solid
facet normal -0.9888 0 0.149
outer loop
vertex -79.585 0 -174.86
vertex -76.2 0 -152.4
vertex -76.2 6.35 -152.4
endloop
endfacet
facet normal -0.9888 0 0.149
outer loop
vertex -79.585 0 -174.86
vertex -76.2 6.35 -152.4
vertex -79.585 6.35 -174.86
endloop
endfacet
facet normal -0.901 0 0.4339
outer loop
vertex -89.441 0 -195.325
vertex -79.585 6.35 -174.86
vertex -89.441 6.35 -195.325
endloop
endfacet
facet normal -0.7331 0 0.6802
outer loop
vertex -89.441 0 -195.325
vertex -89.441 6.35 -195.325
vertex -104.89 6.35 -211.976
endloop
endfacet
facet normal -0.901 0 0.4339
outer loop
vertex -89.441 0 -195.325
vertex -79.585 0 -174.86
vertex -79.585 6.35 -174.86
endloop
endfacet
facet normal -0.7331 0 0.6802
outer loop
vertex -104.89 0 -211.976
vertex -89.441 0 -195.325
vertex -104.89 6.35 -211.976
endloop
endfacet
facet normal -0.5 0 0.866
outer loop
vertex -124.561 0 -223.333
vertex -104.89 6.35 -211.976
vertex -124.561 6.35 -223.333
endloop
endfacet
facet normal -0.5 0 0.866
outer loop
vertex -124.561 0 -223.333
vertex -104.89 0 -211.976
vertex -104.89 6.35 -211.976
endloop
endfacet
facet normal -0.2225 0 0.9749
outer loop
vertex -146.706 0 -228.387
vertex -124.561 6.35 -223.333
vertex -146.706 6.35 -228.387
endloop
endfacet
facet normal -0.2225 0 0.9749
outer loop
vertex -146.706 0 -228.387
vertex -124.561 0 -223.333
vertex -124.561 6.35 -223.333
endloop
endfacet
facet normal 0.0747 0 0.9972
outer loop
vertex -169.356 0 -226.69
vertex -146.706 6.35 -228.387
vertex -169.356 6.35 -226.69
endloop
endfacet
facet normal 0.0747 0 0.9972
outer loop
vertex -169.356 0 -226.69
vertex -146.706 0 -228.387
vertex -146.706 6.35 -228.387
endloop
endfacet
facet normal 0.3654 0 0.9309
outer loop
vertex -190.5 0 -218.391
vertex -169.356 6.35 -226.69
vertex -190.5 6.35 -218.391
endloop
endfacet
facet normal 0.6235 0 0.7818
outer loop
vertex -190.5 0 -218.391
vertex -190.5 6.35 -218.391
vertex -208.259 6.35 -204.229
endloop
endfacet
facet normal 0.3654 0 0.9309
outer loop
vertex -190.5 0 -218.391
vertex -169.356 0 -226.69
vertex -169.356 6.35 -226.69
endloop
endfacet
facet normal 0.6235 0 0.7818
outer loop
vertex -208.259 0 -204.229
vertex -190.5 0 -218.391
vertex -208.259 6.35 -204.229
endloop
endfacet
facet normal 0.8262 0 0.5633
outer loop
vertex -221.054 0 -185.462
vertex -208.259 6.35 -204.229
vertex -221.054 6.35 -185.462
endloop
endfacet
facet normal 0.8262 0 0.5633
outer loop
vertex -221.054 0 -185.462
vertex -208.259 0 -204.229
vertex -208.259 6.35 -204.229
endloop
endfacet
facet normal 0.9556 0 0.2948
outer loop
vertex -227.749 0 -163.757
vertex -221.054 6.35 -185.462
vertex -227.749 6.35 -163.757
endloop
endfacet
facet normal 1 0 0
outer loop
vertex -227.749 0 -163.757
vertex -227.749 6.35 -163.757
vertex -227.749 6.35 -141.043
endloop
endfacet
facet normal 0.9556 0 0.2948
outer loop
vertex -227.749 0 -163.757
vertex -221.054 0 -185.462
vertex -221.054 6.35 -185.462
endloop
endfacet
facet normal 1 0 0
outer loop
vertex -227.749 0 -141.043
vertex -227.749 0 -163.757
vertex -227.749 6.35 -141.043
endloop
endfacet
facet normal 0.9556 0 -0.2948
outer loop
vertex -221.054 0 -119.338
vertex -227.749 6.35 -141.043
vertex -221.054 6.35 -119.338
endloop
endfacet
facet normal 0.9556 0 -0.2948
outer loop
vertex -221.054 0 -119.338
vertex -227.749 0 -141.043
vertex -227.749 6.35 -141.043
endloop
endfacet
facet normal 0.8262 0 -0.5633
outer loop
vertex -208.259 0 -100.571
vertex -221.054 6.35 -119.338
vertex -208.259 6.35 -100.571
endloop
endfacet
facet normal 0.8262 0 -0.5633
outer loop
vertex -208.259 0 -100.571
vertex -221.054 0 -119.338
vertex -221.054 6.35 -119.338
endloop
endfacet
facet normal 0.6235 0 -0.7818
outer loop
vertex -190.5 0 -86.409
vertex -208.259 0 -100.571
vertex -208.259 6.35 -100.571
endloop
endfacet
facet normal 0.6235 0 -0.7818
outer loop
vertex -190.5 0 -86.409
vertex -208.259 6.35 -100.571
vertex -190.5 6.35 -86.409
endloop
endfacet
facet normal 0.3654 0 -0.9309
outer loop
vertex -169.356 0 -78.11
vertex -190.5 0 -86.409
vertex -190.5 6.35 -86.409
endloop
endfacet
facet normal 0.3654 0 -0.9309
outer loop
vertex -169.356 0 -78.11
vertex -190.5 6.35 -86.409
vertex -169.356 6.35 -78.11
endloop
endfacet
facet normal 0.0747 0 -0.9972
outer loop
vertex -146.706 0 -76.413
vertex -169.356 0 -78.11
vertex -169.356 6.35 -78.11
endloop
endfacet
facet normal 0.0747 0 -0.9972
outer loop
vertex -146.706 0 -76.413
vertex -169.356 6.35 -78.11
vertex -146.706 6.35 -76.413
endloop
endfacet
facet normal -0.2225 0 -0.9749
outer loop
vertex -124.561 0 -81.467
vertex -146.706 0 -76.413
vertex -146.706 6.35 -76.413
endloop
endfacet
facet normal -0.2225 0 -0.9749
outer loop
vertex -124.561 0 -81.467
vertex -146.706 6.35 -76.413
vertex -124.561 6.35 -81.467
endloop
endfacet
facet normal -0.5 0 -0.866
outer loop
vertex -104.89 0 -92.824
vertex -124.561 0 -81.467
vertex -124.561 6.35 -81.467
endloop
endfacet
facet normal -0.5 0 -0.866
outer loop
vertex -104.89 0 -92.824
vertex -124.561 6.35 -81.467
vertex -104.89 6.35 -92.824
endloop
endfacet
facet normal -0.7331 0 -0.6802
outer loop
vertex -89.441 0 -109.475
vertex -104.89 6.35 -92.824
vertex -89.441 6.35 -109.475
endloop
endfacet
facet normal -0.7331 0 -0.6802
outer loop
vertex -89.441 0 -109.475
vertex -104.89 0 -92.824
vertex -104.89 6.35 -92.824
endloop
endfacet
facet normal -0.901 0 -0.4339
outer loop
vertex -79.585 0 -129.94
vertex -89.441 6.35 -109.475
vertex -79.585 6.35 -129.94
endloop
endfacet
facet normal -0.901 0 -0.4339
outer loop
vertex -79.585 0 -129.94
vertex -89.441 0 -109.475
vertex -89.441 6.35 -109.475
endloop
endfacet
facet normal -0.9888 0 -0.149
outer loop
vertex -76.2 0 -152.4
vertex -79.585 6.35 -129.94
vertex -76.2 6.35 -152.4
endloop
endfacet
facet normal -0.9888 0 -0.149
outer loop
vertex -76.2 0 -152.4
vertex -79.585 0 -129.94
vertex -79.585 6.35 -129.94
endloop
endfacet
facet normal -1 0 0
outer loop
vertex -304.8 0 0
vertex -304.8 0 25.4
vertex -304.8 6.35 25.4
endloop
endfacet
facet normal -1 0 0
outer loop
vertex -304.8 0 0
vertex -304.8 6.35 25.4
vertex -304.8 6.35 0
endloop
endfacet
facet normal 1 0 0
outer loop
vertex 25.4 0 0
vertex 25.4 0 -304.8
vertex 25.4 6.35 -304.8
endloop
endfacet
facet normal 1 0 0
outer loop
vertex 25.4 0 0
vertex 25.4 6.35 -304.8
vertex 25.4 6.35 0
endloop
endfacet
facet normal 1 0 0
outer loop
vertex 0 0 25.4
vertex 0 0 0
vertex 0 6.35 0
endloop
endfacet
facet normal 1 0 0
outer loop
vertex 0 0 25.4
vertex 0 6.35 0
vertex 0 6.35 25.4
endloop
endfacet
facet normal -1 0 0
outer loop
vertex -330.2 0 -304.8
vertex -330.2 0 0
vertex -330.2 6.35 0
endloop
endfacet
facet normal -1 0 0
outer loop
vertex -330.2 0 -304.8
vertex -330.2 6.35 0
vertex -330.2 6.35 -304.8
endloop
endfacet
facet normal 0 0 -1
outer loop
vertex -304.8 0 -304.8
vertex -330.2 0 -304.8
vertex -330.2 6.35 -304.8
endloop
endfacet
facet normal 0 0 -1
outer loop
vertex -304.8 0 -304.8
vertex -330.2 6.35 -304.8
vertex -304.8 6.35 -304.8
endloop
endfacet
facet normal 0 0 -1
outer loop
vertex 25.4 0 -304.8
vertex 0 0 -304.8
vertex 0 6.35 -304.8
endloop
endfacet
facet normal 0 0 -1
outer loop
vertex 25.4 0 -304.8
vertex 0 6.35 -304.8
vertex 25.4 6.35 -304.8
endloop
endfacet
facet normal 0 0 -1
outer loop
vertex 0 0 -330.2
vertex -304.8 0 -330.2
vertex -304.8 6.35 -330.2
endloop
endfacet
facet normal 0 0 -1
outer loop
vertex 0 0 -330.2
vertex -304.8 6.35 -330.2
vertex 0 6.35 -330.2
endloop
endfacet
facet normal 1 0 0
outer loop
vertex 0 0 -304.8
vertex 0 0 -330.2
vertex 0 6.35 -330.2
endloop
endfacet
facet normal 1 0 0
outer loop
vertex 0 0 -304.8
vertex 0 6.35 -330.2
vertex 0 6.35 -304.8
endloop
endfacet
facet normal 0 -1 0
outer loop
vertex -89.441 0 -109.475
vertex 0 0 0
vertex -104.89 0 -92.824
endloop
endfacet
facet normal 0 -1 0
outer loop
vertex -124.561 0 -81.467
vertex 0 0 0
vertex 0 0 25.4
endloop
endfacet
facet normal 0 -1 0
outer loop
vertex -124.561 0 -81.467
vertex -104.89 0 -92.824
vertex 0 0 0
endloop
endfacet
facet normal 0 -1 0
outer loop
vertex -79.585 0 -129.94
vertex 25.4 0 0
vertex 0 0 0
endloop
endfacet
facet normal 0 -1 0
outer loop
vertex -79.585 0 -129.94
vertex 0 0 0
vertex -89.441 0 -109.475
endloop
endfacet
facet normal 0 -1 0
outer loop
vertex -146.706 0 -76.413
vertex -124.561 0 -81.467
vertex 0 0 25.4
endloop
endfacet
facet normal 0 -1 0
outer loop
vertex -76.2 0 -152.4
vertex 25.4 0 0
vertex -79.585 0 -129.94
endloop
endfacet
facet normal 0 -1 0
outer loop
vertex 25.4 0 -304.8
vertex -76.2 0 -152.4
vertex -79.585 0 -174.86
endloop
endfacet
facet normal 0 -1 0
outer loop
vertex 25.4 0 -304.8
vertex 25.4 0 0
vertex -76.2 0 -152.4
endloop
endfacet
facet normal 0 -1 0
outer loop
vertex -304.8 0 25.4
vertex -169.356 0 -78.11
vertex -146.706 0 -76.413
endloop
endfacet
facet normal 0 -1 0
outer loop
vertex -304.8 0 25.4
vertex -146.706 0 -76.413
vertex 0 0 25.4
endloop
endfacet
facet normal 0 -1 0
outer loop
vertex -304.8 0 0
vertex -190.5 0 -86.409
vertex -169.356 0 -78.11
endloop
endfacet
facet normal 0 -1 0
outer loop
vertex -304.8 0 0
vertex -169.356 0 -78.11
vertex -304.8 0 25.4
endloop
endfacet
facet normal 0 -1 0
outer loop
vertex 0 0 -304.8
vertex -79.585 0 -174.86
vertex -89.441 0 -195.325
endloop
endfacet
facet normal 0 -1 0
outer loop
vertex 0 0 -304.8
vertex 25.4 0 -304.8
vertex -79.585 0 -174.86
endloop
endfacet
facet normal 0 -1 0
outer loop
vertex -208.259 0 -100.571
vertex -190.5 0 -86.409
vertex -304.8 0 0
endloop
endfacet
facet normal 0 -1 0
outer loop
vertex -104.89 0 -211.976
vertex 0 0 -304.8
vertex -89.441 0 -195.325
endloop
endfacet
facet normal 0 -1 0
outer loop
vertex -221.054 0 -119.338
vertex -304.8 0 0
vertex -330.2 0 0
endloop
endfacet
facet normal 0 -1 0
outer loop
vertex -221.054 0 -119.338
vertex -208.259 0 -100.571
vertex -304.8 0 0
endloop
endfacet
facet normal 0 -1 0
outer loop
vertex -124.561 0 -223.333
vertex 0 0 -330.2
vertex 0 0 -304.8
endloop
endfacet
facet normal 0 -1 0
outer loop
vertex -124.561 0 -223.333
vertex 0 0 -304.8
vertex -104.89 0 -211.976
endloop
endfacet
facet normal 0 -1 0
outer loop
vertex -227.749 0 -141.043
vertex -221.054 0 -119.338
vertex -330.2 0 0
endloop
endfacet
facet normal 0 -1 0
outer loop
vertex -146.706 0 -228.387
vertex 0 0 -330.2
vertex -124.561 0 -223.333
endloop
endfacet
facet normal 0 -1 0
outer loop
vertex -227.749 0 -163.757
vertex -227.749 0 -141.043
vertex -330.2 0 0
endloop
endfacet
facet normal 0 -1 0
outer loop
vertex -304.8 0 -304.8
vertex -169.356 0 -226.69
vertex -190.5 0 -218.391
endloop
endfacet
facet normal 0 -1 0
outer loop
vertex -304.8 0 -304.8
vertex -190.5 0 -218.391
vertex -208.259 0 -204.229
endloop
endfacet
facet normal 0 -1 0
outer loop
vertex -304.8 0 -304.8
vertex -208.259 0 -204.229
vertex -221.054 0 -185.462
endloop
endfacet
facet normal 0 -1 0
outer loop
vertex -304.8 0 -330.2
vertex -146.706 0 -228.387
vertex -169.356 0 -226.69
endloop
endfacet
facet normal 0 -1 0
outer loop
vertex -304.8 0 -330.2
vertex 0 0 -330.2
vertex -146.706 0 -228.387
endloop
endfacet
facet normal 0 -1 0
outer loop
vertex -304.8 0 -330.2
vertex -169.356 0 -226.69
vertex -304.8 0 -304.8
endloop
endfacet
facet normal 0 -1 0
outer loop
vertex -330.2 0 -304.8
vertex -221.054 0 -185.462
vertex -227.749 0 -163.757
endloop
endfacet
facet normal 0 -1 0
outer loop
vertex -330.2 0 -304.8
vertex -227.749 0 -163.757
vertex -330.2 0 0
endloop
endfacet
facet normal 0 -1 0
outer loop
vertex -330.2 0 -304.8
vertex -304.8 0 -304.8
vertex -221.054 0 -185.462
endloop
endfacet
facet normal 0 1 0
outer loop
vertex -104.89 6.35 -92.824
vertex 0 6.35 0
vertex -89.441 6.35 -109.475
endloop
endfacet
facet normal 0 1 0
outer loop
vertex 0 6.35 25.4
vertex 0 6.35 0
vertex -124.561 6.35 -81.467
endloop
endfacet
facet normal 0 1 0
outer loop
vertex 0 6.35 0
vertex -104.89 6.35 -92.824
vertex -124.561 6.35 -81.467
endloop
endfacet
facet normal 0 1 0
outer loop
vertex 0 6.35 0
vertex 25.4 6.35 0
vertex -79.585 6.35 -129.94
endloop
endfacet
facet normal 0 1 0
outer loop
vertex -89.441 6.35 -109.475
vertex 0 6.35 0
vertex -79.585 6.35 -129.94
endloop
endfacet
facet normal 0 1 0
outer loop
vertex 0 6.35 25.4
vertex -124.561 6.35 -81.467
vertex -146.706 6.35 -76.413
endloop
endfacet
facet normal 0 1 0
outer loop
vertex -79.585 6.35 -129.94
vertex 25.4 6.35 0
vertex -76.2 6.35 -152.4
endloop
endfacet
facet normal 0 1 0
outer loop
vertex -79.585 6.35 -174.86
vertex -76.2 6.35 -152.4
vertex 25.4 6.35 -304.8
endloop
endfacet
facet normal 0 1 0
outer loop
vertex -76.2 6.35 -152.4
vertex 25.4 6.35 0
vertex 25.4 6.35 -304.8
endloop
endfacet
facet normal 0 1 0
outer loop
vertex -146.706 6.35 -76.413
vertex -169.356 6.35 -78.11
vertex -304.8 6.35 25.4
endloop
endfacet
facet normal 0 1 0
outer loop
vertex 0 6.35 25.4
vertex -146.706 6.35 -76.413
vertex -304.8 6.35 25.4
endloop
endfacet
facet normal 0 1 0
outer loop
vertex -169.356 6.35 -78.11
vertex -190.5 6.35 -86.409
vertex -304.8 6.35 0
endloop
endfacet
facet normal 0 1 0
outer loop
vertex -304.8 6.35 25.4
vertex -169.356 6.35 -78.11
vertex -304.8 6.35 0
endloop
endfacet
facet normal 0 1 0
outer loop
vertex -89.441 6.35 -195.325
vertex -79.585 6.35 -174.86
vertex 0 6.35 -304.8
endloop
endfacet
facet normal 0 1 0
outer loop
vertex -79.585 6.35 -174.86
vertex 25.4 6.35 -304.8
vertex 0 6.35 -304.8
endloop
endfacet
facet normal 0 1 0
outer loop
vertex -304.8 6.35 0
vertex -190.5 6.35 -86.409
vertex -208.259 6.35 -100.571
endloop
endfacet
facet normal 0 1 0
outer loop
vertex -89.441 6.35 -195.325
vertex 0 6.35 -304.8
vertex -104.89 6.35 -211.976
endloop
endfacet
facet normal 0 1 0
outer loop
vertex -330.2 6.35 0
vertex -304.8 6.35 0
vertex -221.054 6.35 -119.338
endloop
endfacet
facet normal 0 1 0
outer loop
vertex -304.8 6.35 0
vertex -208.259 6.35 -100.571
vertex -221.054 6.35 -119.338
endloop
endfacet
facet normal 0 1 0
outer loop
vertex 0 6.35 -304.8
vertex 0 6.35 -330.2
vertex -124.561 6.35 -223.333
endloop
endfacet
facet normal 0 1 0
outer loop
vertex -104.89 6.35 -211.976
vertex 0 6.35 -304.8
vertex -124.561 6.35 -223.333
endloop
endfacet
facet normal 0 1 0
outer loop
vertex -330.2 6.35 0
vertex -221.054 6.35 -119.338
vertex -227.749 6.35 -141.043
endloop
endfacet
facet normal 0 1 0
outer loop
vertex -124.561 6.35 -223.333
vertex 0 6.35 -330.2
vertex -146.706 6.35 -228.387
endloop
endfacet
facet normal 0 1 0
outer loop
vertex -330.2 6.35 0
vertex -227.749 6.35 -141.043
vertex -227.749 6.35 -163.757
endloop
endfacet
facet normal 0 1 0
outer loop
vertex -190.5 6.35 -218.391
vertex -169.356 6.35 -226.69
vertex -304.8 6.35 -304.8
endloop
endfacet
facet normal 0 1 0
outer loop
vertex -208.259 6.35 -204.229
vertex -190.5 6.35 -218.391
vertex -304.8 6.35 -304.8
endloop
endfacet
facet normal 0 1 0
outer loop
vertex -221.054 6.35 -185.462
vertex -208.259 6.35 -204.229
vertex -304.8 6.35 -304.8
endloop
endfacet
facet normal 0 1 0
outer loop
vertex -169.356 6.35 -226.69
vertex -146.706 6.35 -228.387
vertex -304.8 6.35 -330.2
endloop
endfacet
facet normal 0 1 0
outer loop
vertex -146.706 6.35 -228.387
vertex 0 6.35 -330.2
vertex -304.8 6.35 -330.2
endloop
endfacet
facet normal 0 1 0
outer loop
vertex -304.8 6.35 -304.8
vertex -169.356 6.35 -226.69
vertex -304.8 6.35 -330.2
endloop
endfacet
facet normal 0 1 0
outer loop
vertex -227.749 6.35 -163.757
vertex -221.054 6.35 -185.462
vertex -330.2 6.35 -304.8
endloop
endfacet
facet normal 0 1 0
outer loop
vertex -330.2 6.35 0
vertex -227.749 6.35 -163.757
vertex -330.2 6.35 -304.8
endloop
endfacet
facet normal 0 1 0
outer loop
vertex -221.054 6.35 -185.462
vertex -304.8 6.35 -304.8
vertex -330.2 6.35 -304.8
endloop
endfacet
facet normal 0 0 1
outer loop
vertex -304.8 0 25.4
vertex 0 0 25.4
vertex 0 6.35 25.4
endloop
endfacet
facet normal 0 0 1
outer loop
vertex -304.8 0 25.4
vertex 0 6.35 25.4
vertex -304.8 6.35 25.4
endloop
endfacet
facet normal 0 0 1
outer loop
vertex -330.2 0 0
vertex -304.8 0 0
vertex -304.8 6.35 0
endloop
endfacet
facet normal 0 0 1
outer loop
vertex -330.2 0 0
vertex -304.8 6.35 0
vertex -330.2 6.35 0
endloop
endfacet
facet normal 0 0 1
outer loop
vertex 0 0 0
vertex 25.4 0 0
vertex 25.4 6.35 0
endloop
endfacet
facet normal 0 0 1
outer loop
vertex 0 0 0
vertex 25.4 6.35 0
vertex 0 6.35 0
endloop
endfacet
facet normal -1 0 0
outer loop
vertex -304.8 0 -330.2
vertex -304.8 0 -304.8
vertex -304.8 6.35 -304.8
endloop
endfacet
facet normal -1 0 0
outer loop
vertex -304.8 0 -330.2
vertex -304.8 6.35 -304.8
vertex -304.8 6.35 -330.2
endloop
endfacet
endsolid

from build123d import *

# Parameters (mm, degrees)
SKETCH1_R           = 76.2
BOSS_EXTRUDE1_DEPTH = 6.35


with BuildPart() as part:
    # Sketch1 → Boss-Extrude1 (new body)
    with BuildSketch(Plane(origin=(0, 0, 0), x_dir=(1, 0, 0), z_dir=(0, 1, 0))):
        Polygon((0, 0), (0, -25.4), (-304.8, -25.4), (-304.8, 0), (-330.2, 0), (-330.2, 304.8), (-304.8, 304.8), (-304.8, 330.2), (0, 330.2), (0, 304.8), (25.4, 304.8), (25.4, 0), align=None)
        with Locations((-152.4, 152.4)):
            Circle(SKETCH1_R, mode=Mode.SUBTRACT)
    extrude(amount=BOSS_EXTRUDE1_DEPTH)


solid = part.part
